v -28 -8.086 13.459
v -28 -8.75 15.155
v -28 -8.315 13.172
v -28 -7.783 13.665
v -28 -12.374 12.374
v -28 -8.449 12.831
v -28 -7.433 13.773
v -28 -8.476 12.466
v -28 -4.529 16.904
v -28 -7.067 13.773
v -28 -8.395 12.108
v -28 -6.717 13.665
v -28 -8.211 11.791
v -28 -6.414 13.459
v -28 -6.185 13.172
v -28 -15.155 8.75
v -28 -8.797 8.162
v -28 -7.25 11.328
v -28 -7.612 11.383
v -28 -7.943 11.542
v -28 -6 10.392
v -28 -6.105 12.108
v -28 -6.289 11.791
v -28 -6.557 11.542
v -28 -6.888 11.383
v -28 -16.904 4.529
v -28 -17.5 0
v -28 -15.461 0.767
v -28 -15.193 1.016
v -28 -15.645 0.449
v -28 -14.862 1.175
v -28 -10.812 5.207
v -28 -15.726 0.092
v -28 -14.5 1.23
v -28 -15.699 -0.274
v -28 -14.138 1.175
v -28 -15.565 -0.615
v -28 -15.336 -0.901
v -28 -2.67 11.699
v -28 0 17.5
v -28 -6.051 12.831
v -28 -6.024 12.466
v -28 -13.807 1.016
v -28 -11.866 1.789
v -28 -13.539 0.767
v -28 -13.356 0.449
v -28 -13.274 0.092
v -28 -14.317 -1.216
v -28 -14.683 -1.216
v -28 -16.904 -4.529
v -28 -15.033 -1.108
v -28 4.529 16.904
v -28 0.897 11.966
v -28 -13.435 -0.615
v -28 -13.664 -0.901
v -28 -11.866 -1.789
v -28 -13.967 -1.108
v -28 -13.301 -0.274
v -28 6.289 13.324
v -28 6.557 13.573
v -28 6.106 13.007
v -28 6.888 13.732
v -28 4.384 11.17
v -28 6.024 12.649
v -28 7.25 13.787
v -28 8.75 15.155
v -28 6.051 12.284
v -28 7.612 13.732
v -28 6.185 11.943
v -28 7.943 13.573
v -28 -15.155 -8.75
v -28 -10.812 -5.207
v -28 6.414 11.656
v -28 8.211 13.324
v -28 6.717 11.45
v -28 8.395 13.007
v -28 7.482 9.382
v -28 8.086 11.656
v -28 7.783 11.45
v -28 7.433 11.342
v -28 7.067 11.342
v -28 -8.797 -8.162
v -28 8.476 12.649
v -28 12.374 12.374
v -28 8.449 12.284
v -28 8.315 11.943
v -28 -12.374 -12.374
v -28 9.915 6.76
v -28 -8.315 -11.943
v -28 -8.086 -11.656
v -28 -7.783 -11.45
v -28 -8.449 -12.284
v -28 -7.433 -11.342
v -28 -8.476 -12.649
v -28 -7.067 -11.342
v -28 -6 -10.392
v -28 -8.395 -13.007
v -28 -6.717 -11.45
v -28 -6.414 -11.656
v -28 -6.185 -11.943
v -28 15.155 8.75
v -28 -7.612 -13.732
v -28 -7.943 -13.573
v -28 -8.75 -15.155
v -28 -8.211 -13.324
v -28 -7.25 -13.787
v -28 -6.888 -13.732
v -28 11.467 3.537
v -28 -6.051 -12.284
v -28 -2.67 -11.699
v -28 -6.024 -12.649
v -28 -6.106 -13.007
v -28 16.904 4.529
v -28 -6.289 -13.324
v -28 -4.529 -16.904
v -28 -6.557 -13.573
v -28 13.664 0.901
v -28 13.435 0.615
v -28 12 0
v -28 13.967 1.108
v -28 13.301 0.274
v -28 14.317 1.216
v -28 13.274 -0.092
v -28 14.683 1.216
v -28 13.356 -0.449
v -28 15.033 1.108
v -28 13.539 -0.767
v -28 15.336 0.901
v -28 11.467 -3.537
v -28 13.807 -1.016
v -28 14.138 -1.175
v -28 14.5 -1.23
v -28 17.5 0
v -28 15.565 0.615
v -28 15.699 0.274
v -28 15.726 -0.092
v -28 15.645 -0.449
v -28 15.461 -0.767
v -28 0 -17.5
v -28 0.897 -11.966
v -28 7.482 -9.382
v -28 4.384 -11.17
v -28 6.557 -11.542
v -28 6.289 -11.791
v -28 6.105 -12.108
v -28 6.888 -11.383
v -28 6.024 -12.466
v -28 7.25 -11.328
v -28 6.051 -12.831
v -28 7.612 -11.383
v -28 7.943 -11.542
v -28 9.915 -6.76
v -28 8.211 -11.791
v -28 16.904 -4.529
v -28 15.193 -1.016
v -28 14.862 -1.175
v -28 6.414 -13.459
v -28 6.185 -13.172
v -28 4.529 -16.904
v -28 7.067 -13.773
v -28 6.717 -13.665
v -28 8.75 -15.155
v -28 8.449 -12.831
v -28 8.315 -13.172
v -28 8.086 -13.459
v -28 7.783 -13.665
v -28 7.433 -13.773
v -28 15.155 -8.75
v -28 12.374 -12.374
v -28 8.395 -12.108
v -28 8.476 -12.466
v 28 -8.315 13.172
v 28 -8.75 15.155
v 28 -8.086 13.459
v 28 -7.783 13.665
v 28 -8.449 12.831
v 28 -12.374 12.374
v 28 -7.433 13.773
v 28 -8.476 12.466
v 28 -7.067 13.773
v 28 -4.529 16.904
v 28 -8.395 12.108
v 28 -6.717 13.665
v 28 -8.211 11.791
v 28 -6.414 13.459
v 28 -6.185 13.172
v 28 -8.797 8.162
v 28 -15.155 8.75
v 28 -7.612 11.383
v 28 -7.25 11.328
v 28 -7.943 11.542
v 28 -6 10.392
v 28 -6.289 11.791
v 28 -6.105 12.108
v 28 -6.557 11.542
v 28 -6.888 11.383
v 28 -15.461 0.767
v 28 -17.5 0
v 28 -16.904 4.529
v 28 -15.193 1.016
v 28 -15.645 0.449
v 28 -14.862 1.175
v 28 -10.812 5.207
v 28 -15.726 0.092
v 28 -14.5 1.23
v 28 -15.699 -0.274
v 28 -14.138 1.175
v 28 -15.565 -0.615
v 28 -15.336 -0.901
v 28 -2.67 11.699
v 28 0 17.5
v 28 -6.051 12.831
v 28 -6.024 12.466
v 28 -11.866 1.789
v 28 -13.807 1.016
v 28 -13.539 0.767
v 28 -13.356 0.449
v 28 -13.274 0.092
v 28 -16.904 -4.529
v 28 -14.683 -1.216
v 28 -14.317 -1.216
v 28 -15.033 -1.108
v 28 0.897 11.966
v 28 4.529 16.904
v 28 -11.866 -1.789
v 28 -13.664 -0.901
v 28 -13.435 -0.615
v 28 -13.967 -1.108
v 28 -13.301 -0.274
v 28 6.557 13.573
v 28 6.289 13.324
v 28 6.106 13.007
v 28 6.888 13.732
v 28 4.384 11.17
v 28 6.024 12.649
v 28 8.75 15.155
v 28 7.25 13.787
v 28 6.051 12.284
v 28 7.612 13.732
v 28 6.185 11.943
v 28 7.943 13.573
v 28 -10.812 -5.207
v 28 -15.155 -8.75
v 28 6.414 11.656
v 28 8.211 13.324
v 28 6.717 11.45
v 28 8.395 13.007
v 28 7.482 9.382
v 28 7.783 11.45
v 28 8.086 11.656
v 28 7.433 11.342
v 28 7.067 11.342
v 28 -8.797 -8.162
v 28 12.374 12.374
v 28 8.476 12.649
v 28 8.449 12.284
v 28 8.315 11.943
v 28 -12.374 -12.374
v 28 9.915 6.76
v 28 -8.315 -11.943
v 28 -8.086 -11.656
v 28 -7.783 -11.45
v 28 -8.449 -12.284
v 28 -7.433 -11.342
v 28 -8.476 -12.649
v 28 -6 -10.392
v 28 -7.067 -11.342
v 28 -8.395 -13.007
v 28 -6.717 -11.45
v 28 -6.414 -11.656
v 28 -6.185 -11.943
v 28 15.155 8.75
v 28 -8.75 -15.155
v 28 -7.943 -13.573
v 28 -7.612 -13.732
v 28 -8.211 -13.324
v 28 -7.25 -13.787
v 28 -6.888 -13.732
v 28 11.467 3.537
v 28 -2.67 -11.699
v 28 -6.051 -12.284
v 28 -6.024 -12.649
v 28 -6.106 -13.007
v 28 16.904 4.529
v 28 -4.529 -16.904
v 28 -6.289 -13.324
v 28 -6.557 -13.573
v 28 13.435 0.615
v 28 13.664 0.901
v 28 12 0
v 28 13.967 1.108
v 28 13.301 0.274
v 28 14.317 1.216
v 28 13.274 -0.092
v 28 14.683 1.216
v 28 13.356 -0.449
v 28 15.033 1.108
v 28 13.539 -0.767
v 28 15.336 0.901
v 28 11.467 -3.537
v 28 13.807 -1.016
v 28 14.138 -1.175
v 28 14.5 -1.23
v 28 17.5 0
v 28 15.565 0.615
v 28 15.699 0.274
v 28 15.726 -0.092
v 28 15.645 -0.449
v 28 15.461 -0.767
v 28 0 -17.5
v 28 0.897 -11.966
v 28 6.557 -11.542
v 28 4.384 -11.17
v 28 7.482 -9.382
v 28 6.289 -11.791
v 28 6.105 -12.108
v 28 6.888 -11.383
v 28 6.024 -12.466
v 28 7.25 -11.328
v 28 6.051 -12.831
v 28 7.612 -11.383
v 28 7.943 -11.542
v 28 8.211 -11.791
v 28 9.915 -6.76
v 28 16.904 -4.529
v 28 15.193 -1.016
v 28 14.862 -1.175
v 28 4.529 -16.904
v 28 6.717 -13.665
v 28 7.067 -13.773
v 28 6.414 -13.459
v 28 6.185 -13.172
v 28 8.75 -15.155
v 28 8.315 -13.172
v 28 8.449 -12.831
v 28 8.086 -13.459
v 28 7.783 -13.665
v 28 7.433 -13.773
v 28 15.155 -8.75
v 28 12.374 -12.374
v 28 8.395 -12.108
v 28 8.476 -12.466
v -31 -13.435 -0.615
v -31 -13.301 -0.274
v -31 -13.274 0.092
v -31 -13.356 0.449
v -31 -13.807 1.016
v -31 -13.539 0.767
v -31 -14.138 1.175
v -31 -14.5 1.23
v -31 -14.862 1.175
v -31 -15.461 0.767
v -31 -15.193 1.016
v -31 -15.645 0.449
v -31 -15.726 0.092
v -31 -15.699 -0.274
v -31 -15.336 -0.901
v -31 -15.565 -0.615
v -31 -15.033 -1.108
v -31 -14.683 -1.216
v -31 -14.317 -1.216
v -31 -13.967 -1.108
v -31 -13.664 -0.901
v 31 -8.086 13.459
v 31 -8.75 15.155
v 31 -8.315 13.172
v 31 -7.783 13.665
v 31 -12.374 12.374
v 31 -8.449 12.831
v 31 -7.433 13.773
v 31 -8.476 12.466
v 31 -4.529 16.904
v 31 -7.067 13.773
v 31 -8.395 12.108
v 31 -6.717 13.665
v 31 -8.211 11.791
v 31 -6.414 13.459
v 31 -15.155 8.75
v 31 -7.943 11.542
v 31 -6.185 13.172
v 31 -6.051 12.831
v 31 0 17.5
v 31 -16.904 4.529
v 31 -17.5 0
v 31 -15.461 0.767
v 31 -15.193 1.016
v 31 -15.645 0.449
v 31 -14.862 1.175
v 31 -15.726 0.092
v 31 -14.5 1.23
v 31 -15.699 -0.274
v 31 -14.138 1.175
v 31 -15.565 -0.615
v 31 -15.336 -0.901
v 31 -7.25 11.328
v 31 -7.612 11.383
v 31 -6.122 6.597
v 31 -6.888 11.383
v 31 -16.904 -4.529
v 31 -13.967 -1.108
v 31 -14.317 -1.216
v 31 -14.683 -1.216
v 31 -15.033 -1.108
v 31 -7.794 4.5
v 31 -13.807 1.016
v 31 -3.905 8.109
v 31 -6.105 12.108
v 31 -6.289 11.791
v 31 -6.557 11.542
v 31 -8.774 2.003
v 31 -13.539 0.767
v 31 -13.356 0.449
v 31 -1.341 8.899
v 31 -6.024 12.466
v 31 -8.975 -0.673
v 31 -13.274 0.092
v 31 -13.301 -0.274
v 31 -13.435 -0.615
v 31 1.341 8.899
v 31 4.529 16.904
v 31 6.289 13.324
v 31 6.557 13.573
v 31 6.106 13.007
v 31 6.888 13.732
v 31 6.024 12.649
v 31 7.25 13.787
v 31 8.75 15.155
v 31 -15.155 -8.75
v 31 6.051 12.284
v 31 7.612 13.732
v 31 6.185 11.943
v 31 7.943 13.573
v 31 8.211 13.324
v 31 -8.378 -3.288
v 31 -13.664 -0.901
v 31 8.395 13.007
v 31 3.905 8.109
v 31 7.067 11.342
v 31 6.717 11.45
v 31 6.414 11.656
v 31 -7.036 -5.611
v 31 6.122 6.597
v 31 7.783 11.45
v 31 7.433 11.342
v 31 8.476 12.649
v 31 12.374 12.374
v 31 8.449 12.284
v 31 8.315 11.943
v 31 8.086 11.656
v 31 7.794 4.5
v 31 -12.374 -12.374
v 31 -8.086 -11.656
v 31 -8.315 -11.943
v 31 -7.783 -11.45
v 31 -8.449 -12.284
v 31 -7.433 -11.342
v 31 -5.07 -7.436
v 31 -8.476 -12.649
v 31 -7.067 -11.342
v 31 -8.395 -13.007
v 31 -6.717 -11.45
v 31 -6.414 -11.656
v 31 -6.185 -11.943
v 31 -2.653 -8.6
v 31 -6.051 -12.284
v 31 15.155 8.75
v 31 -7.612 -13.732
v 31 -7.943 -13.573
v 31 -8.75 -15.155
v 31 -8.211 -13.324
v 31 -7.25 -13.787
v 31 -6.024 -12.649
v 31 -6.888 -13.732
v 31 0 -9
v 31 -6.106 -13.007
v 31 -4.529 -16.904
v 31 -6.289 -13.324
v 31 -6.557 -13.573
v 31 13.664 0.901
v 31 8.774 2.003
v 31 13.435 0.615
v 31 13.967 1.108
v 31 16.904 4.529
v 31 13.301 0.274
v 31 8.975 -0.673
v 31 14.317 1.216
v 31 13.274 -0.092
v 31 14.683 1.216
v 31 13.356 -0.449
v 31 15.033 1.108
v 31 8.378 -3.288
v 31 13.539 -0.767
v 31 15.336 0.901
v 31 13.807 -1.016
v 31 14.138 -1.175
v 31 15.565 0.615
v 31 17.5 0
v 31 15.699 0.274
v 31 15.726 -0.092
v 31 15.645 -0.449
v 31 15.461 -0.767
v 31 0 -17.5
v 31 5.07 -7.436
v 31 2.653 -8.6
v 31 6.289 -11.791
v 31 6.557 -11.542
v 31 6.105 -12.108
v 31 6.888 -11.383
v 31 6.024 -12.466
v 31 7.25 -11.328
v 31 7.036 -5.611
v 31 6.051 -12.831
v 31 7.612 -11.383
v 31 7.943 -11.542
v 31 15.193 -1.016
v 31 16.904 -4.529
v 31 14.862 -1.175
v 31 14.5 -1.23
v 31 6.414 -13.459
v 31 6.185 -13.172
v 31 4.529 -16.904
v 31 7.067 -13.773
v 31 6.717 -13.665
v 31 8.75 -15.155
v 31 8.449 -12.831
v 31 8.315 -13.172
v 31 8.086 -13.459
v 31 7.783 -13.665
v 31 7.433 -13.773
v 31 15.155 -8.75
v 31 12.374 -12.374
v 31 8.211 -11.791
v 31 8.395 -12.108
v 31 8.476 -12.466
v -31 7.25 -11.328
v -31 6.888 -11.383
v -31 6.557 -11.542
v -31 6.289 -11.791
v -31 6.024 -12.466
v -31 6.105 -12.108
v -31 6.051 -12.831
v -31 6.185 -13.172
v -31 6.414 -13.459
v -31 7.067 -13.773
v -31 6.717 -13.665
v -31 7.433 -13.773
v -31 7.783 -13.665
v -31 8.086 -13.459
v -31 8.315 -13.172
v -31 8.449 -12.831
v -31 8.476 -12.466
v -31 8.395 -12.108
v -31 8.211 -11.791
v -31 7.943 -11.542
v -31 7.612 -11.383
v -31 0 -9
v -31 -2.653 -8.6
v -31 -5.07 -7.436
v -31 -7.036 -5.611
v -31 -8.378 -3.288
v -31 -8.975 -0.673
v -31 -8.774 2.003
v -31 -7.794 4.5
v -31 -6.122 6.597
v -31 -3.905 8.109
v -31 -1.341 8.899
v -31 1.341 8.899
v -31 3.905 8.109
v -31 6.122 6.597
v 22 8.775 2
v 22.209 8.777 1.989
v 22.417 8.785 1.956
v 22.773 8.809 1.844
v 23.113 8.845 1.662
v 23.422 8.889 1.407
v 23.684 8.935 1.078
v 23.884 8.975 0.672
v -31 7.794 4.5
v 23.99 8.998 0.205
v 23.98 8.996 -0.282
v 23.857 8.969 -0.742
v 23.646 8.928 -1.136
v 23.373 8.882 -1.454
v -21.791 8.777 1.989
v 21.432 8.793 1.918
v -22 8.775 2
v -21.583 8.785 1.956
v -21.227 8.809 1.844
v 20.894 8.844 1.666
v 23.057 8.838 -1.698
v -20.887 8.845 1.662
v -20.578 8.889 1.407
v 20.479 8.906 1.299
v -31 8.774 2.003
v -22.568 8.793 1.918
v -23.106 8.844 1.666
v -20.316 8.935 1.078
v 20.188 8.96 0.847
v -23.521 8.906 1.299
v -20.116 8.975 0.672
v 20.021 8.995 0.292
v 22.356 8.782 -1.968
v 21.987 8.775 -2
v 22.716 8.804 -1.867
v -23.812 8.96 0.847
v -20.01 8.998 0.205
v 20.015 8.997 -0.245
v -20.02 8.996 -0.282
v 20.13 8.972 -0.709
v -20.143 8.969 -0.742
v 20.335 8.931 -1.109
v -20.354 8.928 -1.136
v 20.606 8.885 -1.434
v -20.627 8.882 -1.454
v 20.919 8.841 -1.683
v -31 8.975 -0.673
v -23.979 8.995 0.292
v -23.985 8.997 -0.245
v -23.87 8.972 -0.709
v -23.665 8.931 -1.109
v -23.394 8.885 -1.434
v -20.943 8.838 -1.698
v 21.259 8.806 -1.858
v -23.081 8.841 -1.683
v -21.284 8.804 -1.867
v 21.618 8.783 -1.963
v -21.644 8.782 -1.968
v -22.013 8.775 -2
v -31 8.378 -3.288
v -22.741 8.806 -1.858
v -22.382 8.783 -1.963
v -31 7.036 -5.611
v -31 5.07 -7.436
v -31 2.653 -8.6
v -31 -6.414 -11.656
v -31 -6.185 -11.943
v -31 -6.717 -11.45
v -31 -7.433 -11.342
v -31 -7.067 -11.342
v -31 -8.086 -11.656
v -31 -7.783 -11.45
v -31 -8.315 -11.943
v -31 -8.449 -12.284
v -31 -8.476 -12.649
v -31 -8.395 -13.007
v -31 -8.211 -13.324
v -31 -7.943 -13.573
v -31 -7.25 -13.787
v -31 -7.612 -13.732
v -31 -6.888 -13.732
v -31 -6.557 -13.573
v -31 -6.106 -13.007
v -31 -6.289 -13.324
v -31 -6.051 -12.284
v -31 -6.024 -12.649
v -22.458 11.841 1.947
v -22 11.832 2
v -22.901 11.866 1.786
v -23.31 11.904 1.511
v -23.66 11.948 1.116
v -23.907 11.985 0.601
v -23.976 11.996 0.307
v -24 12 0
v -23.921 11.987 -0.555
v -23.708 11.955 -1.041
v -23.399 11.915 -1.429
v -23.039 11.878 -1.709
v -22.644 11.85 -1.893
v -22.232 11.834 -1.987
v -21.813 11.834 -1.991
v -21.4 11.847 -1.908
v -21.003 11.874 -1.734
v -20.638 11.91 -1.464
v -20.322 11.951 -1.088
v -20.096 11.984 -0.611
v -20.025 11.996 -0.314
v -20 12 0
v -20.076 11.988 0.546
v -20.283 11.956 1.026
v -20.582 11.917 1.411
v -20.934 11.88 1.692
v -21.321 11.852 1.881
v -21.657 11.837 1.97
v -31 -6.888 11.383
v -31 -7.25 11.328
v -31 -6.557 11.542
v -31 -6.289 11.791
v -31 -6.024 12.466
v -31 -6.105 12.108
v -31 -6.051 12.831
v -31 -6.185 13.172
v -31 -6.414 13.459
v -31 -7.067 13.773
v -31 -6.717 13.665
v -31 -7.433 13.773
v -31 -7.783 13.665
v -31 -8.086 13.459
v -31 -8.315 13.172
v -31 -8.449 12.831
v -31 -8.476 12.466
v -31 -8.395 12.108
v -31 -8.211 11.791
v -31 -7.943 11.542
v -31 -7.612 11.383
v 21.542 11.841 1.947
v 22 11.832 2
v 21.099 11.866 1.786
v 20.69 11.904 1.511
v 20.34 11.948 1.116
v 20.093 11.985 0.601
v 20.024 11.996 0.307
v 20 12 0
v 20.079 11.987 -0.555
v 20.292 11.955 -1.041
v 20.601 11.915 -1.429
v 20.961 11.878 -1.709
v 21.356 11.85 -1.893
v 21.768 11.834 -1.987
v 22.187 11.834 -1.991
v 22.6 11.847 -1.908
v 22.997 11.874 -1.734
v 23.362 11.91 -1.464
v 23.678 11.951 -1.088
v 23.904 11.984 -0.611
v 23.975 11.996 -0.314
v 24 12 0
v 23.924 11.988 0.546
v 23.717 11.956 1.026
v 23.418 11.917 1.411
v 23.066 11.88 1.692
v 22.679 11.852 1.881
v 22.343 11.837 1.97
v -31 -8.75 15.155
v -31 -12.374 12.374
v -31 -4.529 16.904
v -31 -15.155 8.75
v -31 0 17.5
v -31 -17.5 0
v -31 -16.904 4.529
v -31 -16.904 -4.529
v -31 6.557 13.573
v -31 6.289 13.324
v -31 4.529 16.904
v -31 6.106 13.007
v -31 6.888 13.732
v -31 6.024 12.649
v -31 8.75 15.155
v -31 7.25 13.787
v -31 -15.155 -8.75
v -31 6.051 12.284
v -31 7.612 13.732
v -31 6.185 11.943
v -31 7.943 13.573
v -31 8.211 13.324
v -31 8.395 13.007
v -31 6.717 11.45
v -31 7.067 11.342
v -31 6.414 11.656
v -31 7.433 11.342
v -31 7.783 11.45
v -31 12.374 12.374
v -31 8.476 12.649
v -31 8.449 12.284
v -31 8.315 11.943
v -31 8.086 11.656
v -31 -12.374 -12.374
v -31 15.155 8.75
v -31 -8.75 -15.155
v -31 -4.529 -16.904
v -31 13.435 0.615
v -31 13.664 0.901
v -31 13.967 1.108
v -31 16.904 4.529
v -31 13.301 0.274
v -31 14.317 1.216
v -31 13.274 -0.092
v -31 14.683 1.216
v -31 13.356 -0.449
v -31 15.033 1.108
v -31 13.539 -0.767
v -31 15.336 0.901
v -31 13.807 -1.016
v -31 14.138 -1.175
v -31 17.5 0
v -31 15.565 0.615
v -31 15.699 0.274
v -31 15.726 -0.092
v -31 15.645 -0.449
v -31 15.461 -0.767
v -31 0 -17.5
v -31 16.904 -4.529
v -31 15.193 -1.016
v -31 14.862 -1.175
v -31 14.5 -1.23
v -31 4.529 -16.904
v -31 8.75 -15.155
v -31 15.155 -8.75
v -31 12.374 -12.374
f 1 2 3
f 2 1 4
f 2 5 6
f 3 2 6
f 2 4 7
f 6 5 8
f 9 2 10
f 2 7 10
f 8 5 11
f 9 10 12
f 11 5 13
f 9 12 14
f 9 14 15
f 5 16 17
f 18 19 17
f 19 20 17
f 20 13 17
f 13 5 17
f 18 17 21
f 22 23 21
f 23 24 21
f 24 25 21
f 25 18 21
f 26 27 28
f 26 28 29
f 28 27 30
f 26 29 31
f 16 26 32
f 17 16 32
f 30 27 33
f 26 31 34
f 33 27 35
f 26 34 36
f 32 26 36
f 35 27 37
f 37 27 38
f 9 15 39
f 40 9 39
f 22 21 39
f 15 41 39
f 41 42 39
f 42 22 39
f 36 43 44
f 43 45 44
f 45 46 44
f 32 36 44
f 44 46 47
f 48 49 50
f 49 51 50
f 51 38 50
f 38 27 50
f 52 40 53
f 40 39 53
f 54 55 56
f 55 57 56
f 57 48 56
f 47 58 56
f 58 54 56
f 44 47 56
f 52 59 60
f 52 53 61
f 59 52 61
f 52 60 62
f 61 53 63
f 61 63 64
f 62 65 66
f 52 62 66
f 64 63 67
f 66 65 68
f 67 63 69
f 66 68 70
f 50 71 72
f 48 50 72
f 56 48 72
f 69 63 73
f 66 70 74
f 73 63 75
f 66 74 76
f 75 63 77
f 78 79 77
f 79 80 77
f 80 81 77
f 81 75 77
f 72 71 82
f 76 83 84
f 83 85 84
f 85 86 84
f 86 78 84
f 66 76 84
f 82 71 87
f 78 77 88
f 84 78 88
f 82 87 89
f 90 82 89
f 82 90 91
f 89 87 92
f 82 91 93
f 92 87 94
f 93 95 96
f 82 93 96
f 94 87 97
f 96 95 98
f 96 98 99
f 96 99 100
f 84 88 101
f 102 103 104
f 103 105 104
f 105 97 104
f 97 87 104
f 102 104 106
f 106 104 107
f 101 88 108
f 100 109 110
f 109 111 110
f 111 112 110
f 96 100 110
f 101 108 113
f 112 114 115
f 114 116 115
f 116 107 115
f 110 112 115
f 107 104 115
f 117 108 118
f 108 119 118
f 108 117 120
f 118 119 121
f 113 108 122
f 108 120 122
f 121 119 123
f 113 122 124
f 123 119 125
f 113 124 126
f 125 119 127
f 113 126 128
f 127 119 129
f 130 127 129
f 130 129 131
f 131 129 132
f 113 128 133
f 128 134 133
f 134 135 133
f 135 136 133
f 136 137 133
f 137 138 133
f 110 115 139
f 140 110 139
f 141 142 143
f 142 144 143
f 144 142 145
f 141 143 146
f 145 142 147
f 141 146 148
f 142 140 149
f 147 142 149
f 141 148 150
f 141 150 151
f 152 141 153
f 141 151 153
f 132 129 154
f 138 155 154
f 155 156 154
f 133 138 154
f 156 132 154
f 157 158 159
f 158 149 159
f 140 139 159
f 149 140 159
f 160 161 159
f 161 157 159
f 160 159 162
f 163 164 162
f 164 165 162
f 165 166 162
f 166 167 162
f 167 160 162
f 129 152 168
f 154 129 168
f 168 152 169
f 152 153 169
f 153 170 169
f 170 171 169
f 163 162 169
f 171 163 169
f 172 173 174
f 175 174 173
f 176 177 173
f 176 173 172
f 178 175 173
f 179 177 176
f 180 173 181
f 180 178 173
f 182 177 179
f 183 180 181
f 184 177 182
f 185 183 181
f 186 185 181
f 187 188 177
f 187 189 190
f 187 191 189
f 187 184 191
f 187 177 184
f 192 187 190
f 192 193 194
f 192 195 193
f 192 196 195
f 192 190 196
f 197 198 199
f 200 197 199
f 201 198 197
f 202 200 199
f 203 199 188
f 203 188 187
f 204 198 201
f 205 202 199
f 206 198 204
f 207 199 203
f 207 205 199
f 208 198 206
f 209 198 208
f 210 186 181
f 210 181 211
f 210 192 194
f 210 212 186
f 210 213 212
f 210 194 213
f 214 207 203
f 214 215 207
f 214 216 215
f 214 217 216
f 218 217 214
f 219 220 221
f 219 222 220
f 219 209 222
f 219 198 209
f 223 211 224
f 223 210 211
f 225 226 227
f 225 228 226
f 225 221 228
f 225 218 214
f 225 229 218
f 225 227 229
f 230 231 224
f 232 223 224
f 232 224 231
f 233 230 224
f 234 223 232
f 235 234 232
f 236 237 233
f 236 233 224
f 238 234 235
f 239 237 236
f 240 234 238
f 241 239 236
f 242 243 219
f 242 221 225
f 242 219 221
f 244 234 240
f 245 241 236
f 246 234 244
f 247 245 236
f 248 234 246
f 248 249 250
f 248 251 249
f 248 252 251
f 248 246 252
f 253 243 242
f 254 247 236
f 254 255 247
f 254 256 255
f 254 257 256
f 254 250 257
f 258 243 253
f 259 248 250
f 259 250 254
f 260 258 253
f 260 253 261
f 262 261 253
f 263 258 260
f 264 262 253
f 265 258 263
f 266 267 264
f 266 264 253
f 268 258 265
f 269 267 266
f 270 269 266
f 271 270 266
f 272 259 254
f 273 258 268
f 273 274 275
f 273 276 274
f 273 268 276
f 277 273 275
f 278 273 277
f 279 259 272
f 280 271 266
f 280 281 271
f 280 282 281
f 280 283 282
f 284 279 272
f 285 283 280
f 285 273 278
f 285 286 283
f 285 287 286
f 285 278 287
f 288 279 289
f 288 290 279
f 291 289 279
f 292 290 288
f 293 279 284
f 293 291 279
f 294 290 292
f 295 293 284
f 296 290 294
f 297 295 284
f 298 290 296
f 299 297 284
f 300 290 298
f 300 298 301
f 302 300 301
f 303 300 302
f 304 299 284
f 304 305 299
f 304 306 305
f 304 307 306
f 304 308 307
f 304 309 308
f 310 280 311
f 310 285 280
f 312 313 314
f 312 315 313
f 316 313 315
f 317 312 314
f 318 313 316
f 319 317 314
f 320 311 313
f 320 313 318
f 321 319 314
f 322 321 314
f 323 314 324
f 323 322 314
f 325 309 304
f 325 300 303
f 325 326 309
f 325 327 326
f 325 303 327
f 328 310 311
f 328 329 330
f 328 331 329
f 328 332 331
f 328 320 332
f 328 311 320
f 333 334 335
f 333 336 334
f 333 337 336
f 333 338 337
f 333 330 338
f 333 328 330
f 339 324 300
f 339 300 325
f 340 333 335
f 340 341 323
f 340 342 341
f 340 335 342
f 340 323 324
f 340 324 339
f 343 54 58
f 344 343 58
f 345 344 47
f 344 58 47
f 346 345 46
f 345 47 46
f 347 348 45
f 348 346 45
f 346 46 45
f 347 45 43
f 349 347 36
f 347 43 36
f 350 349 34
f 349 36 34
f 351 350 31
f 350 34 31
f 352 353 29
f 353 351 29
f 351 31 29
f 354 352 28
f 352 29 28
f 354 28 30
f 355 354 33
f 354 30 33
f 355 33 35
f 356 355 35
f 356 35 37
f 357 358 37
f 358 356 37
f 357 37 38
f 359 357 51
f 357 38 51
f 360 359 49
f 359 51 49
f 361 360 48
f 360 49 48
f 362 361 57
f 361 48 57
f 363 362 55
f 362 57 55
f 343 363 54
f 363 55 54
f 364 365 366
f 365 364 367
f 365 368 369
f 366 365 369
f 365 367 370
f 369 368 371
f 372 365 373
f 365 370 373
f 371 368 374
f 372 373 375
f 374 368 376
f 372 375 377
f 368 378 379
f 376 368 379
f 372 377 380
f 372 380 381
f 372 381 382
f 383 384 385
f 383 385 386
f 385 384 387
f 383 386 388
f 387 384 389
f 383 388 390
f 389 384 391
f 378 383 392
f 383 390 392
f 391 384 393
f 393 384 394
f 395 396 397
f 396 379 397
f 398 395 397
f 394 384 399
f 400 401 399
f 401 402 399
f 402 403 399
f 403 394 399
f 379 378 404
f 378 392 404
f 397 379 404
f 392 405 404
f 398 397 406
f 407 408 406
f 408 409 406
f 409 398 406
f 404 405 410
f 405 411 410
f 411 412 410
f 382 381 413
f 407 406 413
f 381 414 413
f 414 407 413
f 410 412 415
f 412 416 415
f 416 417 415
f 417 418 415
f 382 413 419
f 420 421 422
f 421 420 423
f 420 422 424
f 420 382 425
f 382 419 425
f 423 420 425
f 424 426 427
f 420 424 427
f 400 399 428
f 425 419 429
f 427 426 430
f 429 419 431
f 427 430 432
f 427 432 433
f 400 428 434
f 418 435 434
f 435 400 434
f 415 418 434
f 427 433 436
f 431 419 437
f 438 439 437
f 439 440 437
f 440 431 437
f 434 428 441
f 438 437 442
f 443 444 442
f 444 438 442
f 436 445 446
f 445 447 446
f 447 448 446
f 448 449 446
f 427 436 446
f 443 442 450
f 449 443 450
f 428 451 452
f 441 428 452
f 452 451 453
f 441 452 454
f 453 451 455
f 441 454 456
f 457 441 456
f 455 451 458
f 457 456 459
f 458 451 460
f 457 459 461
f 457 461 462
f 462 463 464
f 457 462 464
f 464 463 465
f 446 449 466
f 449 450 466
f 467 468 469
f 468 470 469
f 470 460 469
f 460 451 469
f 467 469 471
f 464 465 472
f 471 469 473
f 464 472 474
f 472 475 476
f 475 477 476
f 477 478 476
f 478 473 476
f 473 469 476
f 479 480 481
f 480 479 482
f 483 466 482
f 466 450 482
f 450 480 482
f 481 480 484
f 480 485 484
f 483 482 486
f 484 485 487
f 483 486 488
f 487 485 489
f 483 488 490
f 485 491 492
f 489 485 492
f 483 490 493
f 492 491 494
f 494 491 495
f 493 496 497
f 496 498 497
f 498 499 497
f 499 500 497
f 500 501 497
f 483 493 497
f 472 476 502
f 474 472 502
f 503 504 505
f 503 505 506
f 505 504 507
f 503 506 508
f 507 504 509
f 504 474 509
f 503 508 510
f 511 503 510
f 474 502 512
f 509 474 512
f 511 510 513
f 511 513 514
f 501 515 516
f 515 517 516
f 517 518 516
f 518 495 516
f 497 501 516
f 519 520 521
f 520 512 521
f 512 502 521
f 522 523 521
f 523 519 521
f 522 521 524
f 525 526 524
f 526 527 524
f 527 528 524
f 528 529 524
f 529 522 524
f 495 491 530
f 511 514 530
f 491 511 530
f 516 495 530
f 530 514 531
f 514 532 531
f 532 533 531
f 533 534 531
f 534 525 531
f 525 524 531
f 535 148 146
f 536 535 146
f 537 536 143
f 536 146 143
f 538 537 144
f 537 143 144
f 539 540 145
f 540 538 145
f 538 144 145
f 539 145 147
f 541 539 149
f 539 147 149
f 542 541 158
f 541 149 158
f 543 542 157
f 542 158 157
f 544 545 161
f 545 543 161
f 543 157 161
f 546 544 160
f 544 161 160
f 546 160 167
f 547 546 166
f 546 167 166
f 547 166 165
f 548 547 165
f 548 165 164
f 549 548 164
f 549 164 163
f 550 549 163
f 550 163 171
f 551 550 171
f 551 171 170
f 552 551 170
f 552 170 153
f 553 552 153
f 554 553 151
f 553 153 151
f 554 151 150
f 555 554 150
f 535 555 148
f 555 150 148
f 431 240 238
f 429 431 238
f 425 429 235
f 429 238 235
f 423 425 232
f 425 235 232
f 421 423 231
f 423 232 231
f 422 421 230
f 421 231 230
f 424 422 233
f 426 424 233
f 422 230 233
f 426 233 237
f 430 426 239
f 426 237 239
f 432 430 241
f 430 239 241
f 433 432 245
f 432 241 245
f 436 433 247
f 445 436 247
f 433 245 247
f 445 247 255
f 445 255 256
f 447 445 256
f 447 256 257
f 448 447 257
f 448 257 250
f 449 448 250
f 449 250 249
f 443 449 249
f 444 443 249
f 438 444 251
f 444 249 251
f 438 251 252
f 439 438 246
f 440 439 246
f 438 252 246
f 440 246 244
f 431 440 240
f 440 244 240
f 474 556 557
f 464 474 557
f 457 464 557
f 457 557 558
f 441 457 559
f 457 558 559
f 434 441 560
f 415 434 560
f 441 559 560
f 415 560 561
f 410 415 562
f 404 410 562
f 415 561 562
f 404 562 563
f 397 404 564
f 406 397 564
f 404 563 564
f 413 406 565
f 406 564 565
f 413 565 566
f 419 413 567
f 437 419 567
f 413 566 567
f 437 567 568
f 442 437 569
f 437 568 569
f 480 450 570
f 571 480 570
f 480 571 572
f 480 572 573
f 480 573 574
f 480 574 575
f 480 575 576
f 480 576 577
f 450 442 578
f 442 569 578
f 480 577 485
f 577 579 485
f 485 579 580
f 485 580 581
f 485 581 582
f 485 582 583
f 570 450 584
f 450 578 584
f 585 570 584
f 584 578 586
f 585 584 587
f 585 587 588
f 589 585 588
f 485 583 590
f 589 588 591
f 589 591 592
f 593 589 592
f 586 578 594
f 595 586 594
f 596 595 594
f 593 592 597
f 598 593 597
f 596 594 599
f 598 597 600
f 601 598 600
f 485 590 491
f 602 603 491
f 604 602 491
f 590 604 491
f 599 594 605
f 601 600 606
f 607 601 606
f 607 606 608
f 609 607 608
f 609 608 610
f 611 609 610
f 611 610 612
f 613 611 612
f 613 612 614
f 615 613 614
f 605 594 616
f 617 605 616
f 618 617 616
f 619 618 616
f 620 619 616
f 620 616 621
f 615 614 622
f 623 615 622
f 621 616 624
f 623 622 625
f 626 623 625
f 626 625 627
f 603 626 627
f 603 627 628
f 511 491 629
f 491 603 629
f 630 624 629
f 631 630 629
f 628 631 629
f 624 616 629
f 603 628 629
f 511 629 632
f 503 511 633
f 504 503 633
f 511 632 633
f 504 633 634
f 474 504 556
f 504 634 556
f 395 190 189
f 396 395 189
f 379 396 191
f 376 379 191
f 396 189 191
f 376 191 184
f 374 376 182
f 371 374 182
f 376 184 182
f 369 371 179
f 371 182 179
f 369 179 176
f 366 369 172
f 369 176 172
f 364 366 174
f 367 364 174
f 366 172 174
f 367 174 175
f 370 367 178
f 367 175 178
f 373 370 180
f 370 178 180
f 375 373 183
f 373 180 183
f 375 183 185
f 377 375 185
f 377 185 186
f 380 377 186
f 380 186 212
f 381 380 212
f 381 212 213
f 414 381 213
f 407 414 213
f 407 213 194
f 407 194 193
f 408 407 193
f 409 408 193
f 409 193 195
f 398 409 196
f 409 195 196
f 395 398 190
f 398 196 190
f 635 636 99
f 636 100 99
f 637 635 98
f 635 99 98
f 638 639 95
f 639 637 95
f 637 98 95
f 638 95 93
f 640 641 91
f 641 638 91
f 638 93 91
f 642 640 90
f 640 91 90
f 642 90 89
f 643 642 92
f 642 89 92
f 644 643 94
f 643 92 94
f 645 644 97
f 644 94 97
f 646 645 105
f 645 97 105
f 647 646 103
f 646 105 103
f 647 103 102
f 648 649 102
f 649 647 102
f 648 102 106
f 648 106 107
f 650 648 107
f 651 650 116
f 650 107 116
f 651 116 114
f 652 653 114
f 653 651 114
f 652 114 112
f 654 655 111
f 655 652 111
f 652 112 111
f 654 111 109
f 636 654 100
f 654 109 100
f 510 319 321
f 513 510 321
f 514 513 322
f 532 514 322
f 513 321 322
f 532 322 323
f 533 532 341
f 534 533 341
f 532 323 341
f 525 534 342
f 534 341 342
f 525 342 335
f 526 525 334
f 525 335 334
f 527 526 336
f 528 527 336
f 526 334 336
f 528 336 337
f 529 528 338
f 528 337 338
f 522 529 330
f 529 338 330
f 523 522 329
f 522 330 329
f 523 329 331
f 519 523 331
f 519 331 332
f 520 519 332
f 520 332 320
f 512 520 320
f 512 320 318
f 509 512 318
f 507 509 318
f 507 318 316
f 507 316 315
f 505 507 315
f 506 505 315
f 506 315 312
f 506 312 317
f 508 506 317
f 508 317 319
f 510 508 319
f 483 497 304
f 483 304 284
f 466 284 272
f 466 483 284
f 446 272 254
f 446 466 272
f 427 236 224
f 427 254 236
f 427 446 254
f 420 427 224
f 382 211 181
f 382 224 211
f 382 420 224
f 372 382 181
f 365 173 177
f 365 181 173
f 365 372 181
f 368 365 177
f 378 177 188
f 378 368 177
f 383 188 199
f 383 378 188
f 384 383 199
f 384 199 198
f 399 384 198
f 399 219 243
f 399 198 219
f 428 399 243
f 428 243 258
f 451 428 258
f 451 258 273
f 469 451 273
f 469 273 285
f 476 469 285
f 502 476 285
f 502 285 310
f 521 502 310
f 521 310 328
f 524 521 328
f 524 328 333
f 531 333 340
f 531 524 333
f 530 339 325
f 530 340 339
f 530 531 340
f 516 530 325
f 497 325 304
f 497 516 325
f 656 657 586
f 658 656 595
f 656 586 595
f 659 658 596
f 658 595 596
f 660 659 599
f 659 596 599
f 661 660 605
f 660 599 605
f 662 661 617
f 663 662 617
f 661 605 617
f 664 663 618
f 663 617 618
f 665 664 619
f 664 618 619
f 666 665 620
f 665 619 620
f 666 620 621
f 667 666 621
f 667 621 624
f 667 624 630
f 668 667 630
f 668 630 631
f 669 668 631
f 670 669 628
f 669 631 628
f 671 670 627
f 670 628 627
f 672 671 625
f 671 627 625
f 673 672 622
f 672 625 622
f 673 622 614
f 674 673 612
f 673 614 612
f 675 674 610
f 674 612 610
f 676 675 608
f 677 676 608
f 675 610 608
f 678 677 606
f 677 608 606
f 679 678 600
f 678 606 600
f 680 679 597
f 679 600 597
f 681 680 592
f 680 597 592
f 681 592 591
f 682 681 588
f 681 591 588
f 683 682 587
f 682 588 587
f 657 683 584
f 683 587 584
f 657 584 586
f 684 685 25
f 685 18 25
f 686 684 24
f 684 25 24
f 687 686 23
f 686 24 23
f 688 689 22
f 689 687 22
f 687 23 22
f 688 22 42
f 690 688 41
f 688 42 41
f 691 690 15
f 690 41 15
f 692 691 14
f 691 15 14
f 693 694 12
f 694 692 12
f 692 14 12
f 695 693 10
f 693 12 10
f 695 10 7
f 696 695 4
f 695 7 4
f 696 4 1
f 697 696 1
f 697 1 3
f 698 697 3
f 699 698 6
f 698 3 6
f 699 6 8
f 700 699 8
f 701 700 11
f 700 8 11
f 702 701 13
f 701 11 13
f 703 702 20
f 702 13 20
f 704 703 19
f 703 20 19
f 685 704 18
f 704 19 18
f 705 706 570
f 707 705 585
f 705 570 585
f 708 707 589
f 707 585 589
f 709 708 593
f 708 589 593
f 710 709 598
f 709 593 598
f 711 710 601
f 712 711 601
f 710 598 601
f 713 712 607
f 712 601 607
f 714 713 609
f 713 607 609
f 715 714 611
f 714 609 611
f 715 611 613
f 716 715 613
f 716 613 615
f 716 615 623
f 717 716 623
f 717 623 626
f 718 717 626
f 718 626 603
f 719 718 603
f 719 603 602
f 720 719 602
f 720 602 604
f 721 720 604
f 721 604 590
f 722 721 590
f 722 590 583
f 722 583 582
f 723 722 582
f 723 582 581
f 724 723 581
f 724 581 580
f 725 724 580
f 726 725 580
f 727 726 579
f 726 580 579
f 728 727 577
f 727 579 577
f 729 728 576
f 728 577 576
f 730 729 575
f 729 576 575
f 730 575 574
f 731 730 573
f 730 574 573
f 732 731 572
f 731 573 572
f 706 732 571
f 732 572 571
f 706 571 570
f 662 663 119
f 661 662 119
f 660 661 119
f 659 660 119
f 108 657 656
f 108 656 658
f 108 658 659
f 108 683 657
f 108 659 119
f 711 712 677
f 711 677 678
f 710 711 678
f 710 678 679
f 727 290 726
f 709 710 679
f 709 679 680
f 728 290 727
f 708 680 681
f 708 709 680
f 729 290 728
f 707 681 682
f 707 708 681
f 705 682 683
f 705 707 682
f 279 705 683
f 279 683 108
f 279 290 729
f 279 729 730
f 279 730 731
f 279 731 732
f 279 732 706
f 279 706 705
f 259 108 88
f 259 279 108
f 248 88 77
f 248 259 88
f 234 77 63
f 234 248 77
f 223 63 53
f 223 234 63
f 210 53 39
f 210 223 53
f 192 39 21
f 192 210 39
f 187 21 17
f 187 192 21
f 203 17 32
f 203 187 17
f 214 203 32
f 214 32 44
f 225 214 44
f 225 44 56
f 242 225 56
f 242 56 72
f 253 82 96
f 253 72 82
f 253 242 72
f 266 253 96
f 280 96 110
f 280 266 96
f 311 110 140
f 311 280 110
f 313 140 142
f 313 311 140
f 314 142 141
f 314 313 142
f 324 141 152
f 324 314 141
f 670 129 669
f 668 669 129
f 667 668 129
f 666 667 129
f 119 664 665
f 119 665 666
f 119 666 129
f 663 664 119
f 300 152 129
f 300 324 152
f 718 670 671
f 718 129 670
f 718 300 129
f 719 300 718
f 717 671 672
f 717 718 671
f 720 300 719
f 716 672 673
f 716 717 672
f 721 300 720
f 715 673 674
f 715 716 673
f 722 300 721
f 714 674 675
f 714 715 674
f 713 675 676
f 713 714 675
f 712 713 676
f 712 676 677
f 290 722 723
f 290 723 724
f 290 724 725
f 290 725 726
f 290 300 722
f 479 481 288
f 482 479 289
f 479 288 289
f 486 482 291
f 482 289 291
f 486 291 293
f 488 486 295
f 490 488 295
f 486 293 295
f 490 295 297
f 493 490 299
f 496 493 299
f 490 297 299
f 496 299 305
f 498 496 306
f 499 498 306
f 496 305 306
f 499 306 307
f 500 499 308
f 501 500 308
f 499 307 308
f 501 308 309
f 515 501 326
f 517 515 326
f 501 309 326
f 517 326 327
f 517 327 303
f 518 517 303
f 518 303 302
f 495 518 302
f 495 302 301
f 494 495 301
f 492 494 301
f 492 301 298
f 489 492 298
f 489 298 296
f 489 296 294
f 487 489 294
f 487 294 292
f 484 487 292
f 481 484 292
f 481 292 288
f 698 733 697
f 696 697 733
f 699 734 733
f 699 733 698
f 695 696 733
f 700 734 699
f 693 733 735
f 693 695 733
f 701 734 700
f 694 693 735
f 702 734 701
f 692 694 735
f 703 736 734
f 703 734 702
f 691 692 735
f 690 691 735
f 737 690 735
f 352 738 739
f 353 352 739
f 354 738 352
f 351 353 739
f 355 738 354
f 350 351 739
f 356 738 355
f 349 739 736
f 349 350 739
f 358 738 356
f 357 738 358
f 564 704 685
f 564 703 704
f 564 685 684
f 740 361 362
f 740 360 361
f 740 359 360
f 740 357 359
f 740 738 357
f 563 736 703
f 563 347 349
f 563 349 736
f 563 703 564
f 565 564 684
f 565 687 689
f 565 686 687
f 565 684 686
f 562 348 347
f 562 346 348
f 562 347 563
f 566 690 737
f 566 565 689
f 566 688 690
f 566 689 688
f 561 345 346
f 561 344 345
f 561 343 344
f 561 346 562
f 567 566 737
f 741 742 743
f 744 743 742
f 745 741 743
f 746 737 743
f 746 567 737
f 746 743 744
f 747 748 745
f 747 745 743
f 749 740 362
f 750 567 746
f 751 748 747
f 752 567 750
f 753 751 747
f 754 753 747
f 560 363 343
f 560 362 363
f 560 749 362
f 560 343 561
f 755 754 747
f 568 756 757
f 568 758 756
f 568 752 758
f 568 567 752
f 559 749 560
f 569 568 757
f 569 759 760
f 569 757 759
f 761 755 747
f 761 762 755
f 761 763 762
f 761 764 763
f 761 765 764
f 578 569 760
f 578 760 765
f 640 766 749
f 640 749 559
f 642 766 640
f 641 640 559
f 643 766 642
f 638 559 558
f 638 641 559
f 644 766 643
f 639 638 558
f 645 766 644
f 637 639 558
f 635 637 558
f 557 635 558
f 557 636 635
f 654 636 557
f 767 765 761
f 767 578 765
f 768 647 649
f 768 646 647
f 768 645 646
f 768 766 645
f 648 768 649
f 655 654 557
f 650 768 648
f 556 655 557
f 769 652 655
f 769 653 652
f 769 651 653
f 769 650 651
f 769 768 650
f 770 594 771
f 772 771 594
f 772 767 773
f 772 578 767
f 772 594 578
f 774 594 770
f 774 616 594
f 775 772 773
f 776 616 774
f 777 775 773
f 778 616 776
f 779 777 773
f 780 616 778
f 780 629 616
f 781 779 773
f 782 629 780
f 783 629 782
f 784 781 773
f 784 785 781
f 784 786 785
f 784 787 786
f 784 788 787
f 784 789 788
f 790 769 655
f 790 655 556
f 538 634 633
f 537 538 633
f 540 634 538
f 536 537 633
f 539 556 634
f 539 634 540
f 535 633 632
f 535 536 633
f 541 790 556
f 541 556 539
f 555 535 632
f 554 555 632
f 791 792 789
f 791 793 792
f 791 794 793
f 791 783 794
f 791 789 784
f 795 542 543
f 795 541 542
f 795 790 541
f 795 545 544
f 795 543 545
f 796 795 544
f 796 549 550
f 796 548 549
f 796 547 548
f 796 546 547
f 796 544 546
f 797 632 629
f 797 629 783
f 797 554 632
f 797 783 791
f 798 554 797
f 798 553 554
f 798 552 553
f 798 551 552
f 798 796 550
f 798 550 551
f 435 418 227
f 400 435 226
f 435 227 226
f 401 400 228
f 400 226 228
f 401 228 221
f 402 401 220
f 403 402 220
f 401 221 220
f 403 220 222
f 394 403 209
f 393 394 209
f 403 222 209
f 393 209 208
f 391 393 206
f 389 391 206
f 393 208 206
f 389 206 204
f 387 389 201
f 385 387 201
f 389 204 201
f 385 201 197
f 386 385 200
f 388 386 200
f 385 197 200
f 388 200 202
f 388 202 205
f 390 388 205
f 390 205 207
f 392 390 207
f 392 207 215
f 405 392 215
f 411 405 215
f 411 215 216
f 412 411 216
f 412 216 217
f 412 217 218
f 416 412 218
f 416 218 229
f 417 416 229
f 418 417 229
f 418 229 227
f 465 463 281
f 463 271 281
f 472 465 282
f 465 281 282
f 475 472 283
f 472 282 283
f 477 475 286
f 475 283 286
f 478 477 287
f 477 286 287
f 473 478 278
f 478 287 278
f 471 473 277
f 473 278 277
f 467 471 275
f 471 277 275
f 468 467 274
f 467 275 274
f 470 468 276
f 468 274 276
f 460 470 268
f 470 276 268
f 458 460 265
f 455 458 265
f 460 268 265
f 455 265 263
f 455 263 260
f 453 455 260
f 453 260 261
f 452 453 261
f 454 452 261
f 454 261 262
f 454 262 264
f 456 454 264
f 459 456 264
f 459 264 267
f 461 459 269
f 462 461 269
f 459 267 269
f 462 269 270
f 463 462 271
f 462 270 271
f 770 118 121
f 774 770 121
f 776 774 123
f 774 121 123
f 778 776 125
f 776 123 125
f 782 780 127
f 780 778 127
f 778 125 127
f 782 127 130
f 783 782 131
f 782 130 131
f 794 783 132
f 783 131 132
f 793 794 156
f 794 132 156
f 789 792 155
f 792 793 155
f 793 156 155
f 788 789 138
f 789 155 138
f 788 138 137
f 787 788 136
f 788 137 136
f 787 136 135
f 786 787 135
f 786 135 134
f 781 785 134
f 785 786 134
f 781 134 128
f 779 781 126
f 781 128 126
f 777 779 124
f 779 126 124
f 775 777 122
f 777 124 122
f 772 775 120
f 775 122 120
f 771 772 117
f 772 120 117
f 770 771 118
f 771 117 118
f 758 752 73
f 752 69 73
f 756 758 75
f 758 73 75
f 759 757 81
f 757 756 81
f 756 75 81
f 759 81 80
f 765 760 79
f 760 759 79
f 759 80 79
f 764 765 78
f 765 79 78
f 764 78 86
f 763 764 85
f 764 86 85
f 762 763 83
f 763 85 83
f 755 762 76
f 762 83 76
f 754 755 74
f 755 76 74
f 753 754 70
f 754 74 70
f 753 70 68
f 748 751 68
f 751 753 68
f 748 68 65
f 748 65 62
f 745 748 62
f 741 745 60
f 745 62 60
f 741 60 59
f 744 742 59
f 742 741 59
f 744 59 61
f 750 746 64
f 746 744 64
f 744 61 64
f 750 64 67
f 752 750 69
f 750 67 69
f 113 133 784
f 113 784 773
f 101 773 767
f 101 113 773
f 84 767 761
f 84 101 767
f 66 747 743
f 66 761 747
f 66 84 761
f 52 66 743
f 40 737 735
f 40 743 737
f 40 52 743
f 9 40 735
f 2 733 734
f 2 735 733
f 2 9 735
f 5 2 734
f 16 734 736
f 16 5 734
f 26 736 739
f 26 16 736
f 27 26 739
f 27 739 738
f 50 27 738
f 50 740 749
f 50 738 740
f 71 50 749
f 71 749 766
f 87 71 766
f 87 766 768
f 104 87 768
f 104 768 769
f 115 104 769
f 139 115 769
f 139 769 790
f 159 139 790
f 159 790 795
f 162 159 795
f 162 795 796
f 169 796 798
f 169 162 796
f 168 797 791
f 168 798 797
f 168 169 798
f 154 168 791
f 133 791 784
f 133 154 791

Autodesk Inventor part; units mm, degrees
ref_plane "YZ Plane" through (0, 0, 0) normal (1, 0, 0) x (0, 1, 0)
sketch "Sketch1" plane through (0, 0, 0) normal (0, 0, 1) x (1, 0, 0)
  line L0 (-31, 0) -> (-31, 17.5)
  line L1 (-31, 17.5) -> (-28, 17.5)
  line L2 (-28, 17.5) -> (-28, 12)
  line L3 (-28, 12) -> (28, 12)
  line L4 (28, 12) -> (28, 17.5)
  line L5 (28, 17.5) -> (31, 17.5)
  line L6 (31, 17.5) -> (31, 0)
  line L7 (31, 0) -> (-31, 0)
  point P0 (0, 0)
  point P1 (0, 0)
  dimension "d0" = 24
  dimension "d1" = 35
  dimension "d2" = 3
  dimension "d3" = 3
  dimension "d4" = 56
revolve "Revolution1" add sketch "Sketch1" angle 360 about axis through (31, 0, 0) along (-1, 0, 0)
sketch "Sketch2" plane through (31, 0, 0) normal (1, 0, 0) x (0, 0, -1)
  circle A0 centre (0, 0) radius 17.5 projected
  point P0 (0, 0)
hole "Hole1" at (31, 0, 0) direction (-1, 0, 0) diameter 18 end through all
ref_plane "Work Plane1" through (31, 0, 0) normal (1, 0, 0) x (0, 0, -1)
sketch "Sketch3" plane through (31, 0, 0) normal (1, 0, 0) x (0, 0, -1)
  line L0 (0, 0) -> (-20.6833, 0) construction
  line L1 (0, 0) -> (-12.5574, -7.25) construction
  circle A0 centre (0, 0) radius 14.5 construction
  dimension "d15" = 29
  dimension "d14" = 30
hole "Hole2" at (31, -7.25, 12.5574) direction (-1, 0, 0) diameter 2.459 depth 3 thread size "M3x0.5" class "6H" standard "ISO Metric profile"
pattern_circular "Circular Pattern1" count 6 over 360 about axis through (29.5, 0, 0) along (-1, 0, 0) of "Hole2"
mirror "Mirror1" about plane through (0, 0, 0) normal (1, 0, 0) of "Hole2", "Circular Pattern1"
ref_plane "Work Plane3" through (0, 12, 0) normal (0, 1, 0) x (-1, 0, 0)
sketch "Sketch5" plane through (0, 12, 0) normal (0, 1, 0) x (-1, 0, 0)
  line L0 (28, -17.5) -> (28, 17.5) projected
  line L1 (-28, -17.5) -> (-28, 17.5) projected
  point P0 (0, 0)
  point P1 (22, 0)
  point P2 (-22, 0)
  dimension "d37" = 6
  dimension "d38" = 6
hole "Hole4" at (-22, 12, 0) at (22, 12, 0) direction (0, -1, 0) diameter 4 depth 3.5
properties part number "154" material "Stainless Steel"
